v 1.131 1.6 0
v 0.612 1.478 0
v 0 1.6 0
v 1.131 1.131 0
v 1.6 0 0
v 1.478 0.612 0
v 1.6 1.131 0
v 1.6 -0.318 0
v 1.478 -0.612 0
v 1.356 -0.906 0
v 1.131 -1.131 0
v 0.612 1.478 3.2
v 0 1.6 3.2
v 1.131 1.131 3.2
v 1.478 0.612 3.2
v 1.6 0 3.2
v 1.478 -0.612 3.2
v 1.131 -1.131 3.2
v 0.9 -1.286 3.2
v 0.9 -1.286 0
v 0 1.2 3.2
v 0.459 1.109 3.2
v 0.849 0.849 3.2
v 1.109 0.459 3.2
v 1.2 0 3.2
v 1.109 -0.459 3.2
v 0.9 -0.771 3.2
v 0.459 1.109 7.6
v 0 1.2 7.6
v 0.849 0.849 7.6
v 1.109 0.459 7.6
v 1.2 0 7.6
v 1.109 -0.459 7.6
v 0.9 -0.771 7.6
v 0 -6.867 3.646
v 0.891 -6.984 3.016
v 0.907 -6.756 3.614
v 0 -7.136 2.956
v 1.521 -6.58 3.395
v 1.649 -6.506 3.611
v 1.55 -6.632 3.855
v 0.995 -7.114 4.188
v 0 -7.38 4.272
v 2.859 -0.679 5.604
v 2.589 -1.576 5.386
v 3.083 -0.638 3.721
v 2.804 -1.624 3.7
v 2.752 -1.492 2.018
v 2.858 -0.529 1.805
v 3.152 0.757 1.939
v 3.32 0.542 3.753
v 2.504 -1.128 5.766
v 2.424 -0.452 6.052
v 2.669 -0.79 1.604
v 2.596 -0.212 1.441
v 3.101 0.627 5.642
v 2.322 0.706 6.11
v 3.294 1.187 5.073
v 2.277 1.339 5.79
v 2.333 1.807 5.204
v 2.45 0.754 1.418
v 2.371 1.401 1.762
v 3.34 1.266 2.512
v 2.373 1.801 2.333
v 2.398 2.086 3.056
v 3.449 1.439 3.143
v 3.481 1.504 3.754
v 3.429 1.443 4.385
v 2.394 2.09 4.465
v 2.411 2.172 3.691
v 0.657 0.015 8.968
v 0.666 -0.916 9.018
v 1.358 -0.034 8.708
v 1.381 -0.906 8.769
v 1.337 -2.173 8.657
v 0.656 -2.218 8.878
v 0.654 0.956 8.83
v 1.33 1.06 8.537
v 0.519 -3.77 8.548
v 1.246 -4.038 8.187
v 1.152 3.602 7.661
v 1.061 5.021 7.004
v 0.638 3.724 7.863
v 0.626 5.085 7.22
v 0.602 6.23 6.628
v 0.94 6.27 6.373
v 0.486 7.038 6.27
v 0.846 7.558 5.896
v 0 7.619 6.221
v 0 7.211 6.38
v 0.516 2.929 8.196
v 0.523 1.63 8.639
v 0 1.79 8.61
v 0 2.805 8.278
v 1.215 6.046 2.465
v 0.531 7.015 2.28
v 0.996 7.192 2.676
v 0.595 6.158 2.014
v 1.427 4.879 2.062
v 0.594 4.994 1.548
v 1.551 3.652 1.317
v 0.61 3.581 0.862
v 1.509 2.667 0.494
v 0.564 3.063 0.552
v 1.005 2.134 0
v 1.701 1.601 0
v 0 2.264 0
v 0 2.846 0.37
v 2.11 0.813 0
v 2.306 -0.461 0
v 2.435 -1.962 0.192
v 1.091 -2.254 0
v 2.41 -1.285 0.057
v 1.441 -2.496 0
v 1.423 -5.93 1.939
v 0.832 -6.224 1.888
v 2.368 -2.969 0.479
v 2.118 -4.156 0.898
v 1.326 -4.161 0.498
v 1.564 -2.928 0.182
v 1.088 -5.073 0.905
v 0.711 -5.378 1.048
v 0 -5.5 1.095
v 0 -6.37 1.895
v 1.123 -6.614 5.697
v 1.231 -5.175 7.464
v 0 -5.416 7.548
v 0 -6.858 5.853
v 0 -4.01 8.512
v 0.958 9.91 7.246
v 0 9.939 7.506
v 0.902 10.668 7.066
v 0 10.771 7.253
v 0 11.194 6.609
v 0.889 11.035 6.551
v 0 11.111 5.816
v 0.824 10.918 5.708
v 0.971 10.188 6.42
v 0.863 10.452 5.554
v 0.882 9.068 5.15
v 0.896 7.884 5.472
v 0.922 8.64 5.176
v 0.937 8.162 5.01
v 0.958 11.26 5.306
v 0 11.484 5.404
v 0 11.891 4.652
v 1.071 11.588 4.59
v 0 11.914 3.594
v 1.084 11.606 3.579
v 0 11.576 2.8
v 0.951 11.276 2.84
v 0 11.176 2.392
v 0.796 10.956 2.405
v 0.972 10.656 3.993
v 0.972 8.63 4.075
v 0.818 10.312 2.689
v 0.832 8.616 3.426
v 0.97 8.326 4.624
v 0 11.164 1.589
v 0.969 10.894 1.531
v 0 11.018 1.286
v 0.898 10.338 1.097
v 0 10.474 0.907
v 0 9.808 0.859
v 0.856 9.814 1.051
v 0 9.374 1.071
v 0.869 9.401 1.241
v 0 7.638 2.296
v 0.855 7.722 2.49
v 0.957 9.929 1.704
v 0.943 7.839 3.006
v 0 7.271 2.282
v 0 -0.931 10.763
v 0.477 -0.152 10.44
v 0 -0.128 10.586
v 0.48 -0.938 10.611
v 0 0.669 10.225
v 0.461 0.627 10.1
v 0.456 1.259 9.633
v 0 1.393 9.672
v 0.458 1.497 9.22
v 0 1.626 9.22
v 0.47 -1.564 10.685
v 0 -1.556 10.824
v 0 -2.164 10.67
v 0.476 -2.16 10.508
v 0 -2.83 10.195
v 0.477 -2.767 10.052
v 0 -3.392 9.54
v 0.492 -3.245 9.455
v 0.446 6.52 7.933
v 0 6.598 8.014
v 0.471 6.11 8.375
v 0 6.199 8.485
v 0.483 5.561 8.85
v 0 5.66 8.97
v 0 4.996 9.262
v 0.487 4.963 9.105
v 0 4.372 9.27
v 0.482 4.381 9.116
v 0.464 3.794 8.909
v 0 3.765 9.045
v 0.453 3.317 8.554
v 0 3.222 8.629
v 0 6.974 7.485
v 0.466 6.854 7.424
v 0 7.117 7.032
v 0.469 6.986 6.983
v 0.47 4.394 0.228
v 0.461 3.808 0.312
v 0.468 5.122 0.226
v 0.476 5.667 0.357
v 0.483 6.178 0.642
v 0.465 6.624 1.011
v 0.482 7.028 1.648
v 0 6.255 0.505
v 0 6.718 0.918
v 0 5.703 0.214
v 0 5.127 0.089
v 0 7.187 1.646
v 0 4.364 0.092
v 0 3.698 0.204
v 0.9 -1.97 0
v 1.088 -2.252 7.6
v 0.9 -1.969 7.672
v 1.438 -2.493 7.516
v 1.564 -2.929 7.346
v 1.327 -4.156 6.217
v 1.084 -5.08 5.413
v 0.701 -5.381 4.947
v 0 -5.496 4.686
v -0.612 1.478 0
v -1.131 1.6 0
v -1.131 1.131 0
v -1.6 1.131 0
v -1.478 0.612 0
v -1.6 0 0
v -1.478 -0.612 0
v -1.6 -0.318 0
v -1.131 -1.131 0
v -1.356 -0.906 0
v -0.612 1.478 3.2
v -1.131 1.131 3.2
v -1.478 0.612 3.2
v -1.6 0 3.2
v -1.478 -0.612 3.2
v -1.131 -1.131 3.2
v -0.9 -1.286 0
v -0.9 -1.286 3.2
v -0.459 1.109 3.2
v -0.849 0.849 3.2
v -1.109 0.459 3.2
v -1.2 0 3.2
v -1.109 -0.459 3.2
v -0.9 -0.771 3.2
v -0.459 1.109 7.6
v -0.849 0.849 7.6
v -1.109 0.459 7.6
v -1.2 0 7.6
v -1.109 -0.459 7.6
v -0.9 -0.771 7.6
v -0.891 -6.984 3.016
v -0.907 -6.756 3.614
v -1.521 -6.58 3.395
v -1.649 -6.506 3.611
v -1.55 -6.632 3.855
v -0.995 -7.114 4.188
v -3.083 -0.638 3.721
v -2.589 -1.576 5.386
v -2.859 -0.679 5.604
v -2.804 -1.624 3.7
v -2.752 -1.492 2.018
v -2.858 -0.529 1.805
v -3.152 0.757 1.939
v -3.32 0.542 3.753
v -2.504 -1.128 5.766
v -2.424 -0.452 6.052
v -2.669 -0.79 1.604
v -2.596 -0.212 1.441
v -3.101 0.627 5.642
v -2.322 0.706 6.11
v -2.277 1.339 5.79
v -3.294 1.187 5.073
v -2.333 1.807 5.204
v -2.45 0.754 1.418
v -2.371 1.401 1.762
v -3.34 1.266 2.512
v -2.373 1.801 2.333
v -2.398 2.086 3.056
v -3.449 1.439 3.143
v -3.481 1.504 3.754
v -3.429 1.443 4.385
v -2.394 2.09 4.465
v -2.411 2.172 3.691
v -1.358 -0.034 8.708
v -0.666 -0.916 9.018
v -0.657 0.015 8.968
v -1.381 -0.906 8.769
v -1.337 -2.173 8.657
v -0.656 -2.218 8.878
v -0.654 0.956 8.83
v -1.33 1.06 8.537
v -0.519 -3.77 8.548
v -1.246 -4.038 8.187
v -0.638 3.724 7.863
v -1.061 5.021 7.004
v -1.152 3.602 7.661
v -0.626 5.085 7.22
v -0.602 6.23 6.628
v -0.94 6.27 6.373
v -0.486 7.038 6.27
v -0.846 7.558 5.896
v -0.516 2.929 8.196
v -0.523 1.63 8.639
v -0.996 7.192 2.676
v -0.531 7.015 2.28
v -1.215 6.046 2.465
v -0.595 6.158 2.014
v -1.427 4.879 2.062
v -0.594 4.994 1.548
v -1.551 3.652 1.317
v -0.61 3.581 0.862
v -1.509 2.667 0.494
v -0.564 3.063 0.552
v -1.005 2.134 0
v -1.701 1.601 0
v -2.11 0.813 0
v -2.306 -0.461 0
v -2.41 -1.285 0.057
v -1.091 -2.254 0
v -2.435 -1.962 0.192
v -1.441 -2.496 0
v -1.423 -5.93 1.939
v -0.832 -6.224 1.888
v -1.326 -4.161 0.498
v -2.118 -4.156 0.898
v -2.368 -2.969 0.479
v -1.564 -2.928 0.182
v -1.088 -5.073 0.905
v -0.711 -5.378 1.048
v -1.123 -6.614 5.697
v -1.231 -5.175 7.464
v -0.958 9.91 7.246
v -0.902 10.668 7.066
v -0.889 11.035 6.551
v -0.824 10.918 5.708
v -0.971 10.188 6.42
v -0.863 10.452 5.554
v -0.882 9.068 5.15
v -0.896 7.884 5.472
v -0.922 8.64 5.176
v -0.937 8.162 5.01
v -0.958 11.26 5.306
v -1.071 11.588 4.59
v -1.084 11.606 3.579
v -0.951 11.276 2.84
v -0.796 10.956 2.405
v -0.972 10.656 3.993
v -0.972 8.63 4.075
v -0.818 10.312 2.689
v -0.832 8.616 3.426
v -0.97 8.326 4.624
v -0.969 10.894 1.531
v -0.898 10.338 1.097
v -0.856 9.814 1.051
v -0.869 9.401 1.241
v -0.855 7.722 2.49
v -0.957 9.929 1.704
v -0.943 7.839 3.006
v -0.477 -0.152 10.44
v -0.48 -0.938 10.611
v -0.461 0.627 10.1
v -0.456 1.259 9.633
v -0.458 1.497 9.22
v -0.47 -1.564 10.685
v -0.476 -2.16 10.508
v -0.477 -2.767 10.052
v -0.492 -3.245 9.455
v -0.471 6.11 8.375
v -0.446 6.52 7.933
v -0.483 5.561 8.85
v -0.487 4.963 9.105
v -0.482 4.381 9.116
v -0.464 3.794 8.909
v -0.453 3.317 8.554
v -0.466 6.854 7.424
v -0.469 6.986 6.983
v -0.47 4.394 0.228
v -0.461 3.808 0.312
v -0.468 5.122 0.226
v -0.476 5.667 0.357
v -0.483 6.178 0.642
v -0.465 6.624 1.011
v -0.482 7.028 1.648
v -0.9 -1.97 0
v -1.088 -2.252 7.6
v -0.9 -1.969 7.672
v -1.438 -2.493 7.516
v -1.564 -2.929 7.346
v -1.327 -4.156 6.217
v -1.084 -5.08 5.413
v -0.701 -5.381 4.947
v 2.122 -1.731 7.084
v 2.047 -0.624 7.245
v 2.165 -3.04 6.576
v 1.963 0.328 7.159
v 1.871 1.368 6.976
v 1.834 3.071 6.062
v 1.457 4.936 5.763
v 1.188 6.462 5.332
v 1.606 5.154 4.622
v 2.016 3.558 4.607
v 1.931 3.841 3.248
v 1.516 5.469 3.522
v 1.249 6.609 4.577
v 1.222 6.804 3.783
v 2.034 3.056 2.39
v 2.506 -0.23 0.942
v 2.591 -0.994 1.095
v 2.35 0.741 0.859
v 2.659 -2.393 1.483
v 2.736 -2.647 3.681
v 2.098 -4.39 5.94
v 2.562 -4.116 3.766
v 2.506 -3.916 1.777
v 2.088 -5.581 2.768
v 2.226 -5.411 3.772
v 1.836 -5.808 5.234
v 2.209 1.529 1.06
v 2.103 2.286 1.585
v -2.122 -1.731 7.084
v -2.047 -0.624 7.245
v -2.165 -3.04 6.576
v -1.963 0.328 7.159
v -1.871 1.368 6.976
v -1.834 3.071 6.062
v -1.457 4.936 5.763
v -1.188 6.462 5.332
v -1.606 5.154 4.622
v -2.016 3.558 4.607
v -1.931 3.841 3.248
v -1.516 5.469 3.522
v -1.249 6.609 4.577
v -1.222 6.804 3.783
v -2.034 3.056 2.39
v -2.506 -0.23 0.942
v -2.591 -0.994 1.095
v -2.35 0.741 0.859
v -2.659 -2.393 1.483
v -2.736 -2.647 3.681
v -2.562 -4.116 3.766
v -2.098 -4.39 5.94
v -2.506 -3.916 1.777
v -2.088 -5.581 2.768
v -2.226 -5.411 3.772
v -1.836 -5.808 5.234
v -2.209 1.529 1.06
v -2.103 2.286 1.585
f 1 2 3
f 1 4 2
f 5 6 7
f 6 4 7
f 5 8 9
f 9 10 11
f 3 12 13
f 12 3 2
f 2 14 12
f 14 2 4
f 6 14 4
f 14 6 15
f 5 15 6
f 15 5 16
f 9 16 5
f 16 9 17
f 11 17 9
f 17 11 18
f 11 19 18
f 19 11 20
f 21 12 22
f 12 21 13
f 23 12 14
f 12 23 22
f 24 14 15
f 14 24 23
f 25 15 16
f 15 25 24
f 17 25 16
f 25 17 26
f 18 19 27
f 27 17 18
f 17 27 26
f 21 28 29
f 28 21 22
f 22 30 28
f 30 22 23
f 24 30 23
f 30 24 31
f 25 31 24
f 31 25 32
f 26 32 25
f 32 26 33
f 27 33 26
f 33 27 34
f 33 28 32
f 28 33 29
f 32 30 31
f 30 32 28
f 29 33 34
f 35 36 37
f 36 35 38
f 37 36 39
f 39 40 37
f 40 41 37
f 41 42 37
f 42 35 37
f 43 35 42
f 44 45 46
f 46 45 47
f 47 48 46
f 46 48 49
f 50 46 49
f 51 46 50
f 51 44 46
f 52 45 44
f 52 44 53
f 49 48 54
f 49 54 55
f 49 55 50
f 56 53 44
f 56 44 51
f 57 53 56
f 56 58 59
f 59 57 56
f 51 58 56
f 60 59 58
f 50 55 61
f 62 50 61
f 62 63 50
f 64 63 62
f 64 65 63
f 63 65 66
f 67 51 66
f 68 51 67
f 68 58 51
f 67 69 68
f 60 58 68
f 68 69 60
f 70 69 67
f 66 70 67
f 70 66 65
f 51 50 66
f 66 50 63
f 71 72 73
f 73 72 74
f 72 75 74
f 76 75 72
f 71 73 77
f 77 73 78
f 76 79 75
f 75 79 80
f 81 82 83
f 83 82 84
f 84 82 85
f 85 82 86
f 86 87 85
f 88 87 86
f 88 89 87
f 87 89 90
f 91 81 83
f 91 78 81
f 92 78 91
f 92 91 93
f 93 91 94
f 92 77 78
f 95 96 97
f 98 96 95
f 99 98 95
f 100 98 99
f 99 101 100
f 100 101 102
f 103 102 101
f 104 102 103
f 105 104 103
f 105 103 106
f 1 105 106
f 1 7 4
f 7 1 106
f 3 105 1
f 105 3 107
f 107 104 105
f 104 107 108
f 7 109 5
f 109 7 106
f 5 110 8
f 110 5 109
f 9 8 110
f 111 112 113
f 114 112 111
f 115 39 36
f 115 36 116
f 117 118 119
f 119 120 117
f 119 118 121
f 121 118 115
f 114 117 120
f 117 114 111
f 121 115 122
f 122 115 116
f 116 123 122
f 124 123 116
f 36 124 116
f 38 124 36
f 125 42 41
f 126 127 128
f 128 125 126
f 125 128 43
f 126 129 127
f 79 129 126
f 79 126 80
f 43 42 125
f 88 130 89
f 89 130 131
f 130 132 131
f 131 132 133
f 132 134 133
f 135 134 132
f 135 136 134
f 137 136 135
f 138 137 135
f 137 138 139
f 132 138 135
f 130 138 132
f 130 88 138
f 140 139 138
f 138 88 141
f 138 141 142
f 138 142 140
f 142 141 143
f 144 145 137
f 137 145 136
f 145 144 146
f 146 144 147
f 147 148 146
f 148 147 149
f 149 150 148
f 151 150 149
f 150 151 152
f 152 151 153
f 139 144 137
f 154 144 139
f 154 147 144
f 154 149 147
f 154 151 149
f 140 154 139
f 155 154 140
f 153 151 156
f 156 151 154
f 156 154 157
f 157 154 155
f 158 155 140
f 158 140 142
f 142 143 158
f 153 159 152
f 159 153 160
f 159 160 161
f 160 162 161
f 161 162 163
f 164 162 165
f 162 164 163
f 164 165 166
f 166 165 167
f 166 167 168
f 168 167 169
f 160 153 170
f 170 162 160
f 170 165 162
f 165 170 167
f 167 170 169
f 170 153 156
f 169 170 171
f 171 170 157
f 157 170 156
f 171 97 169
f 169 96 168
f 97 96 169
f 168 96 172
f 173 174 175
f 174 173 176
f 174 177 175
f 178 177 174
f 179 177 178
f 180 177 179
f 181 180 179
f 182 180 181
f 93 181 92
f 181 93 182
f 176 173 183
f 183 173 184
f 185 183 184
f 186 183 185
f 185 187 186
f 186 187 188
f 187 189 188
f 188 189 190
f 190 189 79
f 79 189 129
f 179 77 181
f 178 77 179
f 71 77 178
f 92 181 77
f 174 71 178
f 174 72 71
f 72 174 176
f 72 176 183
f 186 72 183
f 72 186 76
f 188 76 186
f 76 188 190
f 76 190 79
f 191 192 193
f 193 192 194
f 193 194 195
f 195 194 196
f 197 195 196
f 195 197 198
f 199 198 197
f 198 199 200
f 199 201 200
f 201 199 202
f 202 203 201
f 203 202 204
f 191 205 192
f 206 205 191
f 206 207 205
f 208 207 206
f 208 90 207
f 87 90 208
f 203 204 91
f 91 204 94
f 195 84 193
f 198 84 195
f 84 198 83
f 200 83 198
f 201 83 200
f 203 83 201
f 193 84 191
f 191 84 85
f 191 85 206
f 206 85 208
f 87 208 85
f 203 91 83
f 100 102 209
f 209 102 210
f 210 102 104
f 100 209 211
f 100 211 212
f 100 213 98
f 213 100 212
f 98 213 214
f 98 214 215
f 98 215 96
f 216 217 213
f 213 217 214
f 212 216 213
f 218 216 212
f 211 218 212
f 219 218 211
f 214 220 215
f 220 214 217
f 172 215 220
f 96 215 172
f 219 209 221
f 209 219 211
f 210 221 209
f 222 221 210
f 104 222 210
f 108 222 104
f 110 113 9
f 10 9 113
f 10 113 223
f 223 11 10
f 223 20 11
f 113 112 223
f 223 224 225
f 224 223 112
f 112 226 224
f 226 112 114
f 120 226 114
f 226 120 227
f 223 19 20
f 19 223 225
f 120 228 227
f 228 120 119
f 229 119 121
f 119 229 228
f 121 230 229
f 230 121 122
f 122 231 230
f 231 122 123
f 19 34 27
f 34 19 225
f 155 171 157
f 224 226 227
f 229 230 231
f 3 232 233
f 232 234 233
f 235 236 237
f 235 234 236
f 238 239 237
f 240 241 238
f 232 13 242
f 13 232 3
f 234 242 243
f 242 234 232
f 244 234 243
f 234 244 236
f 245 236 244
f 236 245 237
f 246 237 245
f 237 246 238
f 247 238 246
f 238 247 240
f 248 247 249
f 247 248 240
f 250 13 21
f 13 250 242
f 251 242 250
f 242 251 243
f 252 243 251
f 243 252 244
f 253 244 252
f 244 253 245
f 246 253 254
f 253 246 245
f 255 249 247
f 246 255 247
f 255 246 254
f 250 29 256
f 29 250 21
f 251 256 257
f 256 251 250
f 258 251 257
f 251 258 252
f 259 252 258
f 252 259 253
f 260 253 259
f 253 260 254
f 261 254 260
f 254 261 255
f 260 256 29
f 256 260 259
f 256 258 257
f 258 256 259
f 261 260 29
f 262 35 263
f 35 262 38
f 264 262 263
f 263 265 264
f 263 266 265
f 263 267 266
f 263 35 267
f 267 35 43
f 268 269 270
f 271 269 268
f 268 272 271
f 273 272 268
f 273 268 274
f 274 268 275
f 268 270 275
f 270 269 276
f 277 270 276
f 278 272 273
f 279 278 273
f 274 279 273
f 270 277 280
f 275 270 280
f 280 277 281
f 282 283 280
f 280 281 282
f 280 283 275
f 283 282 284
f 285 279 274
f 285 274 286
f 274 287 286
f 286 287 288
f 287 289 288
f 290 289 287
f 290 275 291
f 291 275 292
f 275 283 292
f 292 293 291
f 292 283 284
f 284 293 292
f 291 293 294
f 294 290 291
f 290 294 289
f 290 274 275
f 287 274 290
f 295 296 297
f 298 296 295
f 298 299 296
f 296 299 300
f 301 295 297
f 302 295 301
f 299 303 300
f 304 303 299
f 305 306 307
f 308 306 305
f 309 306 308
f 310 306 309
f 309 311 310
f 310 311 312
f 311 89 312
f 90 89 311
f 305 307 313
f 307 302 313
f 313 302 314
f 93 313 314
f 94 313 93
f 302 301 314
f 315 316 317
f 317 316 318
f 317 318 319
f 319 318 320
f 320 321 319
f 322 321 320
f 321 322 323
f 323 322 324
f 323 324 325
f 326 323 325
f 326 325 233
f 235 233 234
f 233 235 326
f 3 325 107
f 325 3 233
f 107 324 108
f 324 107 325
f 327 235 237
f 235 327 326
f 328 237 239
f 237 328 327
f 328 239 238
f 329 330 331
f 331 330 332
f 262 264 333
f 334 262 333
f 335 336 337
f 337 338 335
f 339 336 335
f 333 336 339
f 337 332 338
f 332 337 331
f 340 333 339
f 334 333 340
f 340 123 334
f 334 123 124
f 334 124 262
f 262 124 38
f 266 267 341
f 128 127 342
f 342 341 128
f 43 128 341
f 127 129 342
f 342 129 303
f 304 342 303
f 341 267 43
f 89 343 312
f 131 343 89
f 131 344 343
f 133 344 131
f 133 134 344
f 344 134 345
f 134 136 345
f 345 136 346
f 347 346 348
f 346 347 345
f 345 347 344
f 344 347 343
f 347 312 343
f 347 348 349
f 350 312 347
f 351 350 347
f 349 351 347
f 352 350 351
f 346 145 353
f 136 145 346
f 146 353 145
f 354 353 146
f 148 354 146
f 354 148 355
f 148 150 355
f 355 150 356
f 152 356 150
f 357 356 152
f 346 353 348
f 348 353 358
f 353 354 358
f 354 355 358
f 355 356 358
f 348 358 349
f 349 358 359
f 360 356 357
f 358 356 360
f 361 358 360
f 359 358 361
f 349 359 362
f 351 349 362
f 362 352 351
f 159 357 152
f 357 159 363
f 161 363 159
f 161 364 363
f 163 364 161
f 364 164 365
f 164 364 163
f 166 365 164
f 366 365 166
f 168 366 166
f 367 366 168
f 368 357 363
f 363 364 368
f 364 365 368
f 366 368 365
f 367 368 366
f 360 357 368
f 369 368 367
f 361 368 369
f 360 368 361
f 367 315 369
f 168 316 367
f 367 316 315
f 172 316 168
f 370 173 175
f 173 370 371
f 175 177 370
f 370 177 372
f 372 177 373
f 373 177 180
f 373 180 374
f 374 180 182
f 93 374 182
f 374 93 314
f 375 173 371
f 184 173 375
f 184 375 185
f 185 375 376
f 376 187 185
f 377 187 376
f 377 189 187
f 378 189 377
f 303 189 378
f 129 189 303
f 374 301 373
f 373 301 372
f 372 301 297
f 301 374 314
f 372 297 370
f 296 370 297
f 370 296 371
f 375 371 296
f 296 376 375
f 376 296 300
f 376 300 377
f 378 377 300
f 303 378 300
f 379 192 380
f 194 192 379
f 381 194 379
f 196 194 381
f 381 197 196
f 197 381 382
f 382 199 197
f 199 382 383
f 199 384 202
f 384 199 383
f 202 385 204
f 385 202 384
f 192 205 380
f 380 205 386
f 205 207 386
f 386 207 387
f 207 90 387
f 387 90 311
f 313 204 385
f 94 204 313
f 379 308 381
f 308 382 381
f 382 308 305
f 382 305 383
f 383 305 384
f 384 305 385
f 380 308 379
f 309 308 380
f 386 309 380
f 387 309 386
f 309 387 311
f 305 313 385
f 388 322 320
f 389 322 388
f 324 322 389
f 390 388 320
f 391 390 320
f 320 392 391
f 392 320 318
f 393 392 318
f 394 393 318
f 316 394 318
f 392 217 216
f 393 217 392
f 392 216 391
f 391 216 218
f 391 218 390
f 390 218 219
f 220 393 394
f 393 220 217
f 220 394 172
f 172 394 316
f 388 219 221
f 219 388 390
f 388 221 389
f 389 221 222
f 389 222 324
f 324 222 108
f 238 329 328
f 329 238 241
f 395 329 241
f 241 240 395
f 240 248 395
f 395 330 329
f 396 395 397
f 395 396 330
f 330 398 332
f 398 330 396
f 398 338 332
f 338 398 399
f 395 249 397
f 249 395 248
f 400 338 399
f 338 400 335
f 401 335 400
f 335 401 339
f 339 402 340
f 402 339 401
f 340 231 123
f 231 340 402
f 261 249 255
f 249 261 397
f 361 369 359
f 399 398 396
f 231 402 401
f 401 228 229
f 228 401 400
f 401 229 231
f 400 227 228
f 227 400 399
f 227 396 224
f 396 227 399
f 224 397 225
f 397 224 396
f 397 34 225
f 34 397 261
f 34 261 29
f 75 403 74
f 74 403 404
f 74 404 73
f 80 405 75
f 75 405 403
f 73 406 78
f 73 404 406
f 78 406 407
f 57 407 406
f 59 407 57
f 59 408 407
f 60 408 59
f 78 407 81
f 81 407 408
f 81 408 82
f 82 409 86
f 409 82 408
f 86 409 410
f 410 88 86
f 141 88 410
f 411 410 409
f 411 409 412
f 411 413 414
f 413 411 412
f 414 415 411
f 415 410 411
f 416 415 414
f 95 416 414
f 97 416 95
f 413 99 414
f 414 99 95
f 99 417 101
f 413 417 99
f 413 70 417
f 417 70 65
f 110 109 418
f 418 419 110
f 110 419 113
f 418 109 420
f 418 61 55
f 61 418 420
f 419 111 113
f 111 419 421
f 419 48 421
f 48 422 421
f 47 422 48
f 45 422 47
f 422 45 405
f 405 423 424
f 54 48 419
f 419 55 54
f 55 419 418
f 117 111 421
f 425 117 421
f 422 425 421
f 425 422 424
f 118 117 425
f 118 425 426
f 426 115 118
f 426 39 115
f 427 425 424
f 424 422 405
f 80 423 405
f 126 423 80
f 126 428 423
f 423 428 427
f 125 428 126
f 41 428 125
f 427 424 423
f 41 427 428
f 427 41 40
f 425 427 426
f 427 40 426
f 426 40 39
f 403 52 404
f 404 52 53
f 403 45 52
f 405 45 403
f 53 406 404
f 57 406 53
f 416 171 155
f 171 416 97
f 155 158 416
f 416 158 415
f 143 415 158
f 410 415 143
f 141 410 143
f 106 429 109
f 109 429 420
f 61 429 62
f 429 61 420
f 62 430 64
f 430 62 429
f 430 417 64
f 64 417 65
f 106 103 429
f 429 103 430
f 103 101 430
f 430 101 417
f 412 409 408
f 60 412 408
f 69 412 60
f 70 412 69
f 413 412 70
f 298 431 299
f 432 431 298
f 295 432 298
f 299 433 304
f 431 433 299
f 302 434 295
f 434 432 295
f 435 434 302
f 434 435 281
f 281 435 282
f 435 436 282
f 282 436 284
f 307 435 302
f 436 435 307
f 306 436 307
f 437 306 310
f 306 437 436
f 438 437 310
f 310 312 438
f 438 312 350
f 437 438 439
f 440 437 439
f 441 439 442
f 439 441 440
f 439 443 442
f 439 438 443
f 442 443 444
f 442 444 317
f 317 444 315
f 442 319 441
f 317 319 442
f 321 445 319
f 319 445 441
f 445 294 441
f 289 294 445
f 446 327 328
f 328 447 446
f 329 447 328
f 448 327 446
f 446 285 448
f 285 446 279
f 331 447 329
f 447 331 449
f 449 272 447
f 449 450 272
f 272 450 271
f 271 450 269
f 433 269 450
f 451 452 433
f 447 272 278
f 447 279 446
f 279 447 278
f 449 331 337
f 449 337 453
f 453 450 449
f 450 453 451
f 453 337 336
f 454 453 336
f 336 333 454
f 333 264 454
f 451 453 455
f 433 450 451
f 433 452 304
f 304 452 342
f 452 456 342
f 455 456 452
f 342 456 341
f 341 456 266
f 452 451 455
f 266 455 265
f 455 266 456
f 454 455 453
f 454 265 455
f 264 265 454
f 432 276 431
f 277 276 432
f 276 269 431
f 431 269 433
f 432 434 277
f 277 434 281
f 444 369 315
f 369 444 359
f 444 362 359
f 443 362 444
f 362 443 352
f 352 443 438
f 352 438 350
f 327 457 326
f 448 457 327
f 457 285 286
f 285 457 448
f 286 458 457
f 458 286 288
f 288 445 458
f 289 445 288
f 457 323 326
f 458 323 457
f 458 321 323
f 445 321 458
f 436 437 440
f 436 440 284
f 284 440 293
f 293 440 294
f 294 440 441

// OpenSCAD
use <../lib.scad>
use <s/8038s01.scad>
use <s/8038s03.scad>
function ldraw_lib__8038() = [
// 0 Animal Clownfish
// 0 Name: 8038.dat
// 0 Author: Gerald Lasser [GeraldLasser]
// 0 !LDRAW_ORG Part UPDATE 2026-05
// 0 !LICENSE Licensed under CC BY 4.0 : see CAreadme.txt
// 
// 0 BFC CERTIFY CCW
  [0,"BFC","CERTIFY"],
  [0,"BFC","CCW"],
// 
// 0 !HISTORY 2026-05-01 {LEGO Instructions App} Original part shape
// 0 !HISTORY 2026-05-01 [GeraldLasser] File preparation for LDraw Parts Tracker
// 0 !HISTORY 2026-05-31 [OrionP] Official Update 2026-05
// 
// 1 16 0 0 0 1 0 0 0 1 0 0 0 1 s\8038s01.dat
  [1,16,0,0,0,1,0,0,0,1,0,0,0,1, ldraw_lib__s__8038s01()],
// 
// 1 16 0 0 0 1 0 0 0 1 0 0 0 1 s\8038s03.dat
  [1,16,0,0,0,1,0,0,0,1,0,0,0,1, ldraw_lib__s__8038s03()],
// 1 16 0 0 0 -1 0 0 0 1 0 0 0 1 s\8038s03.dat
  [1,16,0,0,0,-1,0,0,0,1,0,0,0,1, ldraw_lib__s__8038s03()],
];
module ldraw_lib__8038(step=0, col=false, unit=2/5, alt=false, line=0.2, solid=!$preview)
    makepoly(ldraw_lib__8038(), step=step, col=col, unit=unit, alt=alt, line=line, solid=solid);
ldraw_lib__8038(line=0.2);
